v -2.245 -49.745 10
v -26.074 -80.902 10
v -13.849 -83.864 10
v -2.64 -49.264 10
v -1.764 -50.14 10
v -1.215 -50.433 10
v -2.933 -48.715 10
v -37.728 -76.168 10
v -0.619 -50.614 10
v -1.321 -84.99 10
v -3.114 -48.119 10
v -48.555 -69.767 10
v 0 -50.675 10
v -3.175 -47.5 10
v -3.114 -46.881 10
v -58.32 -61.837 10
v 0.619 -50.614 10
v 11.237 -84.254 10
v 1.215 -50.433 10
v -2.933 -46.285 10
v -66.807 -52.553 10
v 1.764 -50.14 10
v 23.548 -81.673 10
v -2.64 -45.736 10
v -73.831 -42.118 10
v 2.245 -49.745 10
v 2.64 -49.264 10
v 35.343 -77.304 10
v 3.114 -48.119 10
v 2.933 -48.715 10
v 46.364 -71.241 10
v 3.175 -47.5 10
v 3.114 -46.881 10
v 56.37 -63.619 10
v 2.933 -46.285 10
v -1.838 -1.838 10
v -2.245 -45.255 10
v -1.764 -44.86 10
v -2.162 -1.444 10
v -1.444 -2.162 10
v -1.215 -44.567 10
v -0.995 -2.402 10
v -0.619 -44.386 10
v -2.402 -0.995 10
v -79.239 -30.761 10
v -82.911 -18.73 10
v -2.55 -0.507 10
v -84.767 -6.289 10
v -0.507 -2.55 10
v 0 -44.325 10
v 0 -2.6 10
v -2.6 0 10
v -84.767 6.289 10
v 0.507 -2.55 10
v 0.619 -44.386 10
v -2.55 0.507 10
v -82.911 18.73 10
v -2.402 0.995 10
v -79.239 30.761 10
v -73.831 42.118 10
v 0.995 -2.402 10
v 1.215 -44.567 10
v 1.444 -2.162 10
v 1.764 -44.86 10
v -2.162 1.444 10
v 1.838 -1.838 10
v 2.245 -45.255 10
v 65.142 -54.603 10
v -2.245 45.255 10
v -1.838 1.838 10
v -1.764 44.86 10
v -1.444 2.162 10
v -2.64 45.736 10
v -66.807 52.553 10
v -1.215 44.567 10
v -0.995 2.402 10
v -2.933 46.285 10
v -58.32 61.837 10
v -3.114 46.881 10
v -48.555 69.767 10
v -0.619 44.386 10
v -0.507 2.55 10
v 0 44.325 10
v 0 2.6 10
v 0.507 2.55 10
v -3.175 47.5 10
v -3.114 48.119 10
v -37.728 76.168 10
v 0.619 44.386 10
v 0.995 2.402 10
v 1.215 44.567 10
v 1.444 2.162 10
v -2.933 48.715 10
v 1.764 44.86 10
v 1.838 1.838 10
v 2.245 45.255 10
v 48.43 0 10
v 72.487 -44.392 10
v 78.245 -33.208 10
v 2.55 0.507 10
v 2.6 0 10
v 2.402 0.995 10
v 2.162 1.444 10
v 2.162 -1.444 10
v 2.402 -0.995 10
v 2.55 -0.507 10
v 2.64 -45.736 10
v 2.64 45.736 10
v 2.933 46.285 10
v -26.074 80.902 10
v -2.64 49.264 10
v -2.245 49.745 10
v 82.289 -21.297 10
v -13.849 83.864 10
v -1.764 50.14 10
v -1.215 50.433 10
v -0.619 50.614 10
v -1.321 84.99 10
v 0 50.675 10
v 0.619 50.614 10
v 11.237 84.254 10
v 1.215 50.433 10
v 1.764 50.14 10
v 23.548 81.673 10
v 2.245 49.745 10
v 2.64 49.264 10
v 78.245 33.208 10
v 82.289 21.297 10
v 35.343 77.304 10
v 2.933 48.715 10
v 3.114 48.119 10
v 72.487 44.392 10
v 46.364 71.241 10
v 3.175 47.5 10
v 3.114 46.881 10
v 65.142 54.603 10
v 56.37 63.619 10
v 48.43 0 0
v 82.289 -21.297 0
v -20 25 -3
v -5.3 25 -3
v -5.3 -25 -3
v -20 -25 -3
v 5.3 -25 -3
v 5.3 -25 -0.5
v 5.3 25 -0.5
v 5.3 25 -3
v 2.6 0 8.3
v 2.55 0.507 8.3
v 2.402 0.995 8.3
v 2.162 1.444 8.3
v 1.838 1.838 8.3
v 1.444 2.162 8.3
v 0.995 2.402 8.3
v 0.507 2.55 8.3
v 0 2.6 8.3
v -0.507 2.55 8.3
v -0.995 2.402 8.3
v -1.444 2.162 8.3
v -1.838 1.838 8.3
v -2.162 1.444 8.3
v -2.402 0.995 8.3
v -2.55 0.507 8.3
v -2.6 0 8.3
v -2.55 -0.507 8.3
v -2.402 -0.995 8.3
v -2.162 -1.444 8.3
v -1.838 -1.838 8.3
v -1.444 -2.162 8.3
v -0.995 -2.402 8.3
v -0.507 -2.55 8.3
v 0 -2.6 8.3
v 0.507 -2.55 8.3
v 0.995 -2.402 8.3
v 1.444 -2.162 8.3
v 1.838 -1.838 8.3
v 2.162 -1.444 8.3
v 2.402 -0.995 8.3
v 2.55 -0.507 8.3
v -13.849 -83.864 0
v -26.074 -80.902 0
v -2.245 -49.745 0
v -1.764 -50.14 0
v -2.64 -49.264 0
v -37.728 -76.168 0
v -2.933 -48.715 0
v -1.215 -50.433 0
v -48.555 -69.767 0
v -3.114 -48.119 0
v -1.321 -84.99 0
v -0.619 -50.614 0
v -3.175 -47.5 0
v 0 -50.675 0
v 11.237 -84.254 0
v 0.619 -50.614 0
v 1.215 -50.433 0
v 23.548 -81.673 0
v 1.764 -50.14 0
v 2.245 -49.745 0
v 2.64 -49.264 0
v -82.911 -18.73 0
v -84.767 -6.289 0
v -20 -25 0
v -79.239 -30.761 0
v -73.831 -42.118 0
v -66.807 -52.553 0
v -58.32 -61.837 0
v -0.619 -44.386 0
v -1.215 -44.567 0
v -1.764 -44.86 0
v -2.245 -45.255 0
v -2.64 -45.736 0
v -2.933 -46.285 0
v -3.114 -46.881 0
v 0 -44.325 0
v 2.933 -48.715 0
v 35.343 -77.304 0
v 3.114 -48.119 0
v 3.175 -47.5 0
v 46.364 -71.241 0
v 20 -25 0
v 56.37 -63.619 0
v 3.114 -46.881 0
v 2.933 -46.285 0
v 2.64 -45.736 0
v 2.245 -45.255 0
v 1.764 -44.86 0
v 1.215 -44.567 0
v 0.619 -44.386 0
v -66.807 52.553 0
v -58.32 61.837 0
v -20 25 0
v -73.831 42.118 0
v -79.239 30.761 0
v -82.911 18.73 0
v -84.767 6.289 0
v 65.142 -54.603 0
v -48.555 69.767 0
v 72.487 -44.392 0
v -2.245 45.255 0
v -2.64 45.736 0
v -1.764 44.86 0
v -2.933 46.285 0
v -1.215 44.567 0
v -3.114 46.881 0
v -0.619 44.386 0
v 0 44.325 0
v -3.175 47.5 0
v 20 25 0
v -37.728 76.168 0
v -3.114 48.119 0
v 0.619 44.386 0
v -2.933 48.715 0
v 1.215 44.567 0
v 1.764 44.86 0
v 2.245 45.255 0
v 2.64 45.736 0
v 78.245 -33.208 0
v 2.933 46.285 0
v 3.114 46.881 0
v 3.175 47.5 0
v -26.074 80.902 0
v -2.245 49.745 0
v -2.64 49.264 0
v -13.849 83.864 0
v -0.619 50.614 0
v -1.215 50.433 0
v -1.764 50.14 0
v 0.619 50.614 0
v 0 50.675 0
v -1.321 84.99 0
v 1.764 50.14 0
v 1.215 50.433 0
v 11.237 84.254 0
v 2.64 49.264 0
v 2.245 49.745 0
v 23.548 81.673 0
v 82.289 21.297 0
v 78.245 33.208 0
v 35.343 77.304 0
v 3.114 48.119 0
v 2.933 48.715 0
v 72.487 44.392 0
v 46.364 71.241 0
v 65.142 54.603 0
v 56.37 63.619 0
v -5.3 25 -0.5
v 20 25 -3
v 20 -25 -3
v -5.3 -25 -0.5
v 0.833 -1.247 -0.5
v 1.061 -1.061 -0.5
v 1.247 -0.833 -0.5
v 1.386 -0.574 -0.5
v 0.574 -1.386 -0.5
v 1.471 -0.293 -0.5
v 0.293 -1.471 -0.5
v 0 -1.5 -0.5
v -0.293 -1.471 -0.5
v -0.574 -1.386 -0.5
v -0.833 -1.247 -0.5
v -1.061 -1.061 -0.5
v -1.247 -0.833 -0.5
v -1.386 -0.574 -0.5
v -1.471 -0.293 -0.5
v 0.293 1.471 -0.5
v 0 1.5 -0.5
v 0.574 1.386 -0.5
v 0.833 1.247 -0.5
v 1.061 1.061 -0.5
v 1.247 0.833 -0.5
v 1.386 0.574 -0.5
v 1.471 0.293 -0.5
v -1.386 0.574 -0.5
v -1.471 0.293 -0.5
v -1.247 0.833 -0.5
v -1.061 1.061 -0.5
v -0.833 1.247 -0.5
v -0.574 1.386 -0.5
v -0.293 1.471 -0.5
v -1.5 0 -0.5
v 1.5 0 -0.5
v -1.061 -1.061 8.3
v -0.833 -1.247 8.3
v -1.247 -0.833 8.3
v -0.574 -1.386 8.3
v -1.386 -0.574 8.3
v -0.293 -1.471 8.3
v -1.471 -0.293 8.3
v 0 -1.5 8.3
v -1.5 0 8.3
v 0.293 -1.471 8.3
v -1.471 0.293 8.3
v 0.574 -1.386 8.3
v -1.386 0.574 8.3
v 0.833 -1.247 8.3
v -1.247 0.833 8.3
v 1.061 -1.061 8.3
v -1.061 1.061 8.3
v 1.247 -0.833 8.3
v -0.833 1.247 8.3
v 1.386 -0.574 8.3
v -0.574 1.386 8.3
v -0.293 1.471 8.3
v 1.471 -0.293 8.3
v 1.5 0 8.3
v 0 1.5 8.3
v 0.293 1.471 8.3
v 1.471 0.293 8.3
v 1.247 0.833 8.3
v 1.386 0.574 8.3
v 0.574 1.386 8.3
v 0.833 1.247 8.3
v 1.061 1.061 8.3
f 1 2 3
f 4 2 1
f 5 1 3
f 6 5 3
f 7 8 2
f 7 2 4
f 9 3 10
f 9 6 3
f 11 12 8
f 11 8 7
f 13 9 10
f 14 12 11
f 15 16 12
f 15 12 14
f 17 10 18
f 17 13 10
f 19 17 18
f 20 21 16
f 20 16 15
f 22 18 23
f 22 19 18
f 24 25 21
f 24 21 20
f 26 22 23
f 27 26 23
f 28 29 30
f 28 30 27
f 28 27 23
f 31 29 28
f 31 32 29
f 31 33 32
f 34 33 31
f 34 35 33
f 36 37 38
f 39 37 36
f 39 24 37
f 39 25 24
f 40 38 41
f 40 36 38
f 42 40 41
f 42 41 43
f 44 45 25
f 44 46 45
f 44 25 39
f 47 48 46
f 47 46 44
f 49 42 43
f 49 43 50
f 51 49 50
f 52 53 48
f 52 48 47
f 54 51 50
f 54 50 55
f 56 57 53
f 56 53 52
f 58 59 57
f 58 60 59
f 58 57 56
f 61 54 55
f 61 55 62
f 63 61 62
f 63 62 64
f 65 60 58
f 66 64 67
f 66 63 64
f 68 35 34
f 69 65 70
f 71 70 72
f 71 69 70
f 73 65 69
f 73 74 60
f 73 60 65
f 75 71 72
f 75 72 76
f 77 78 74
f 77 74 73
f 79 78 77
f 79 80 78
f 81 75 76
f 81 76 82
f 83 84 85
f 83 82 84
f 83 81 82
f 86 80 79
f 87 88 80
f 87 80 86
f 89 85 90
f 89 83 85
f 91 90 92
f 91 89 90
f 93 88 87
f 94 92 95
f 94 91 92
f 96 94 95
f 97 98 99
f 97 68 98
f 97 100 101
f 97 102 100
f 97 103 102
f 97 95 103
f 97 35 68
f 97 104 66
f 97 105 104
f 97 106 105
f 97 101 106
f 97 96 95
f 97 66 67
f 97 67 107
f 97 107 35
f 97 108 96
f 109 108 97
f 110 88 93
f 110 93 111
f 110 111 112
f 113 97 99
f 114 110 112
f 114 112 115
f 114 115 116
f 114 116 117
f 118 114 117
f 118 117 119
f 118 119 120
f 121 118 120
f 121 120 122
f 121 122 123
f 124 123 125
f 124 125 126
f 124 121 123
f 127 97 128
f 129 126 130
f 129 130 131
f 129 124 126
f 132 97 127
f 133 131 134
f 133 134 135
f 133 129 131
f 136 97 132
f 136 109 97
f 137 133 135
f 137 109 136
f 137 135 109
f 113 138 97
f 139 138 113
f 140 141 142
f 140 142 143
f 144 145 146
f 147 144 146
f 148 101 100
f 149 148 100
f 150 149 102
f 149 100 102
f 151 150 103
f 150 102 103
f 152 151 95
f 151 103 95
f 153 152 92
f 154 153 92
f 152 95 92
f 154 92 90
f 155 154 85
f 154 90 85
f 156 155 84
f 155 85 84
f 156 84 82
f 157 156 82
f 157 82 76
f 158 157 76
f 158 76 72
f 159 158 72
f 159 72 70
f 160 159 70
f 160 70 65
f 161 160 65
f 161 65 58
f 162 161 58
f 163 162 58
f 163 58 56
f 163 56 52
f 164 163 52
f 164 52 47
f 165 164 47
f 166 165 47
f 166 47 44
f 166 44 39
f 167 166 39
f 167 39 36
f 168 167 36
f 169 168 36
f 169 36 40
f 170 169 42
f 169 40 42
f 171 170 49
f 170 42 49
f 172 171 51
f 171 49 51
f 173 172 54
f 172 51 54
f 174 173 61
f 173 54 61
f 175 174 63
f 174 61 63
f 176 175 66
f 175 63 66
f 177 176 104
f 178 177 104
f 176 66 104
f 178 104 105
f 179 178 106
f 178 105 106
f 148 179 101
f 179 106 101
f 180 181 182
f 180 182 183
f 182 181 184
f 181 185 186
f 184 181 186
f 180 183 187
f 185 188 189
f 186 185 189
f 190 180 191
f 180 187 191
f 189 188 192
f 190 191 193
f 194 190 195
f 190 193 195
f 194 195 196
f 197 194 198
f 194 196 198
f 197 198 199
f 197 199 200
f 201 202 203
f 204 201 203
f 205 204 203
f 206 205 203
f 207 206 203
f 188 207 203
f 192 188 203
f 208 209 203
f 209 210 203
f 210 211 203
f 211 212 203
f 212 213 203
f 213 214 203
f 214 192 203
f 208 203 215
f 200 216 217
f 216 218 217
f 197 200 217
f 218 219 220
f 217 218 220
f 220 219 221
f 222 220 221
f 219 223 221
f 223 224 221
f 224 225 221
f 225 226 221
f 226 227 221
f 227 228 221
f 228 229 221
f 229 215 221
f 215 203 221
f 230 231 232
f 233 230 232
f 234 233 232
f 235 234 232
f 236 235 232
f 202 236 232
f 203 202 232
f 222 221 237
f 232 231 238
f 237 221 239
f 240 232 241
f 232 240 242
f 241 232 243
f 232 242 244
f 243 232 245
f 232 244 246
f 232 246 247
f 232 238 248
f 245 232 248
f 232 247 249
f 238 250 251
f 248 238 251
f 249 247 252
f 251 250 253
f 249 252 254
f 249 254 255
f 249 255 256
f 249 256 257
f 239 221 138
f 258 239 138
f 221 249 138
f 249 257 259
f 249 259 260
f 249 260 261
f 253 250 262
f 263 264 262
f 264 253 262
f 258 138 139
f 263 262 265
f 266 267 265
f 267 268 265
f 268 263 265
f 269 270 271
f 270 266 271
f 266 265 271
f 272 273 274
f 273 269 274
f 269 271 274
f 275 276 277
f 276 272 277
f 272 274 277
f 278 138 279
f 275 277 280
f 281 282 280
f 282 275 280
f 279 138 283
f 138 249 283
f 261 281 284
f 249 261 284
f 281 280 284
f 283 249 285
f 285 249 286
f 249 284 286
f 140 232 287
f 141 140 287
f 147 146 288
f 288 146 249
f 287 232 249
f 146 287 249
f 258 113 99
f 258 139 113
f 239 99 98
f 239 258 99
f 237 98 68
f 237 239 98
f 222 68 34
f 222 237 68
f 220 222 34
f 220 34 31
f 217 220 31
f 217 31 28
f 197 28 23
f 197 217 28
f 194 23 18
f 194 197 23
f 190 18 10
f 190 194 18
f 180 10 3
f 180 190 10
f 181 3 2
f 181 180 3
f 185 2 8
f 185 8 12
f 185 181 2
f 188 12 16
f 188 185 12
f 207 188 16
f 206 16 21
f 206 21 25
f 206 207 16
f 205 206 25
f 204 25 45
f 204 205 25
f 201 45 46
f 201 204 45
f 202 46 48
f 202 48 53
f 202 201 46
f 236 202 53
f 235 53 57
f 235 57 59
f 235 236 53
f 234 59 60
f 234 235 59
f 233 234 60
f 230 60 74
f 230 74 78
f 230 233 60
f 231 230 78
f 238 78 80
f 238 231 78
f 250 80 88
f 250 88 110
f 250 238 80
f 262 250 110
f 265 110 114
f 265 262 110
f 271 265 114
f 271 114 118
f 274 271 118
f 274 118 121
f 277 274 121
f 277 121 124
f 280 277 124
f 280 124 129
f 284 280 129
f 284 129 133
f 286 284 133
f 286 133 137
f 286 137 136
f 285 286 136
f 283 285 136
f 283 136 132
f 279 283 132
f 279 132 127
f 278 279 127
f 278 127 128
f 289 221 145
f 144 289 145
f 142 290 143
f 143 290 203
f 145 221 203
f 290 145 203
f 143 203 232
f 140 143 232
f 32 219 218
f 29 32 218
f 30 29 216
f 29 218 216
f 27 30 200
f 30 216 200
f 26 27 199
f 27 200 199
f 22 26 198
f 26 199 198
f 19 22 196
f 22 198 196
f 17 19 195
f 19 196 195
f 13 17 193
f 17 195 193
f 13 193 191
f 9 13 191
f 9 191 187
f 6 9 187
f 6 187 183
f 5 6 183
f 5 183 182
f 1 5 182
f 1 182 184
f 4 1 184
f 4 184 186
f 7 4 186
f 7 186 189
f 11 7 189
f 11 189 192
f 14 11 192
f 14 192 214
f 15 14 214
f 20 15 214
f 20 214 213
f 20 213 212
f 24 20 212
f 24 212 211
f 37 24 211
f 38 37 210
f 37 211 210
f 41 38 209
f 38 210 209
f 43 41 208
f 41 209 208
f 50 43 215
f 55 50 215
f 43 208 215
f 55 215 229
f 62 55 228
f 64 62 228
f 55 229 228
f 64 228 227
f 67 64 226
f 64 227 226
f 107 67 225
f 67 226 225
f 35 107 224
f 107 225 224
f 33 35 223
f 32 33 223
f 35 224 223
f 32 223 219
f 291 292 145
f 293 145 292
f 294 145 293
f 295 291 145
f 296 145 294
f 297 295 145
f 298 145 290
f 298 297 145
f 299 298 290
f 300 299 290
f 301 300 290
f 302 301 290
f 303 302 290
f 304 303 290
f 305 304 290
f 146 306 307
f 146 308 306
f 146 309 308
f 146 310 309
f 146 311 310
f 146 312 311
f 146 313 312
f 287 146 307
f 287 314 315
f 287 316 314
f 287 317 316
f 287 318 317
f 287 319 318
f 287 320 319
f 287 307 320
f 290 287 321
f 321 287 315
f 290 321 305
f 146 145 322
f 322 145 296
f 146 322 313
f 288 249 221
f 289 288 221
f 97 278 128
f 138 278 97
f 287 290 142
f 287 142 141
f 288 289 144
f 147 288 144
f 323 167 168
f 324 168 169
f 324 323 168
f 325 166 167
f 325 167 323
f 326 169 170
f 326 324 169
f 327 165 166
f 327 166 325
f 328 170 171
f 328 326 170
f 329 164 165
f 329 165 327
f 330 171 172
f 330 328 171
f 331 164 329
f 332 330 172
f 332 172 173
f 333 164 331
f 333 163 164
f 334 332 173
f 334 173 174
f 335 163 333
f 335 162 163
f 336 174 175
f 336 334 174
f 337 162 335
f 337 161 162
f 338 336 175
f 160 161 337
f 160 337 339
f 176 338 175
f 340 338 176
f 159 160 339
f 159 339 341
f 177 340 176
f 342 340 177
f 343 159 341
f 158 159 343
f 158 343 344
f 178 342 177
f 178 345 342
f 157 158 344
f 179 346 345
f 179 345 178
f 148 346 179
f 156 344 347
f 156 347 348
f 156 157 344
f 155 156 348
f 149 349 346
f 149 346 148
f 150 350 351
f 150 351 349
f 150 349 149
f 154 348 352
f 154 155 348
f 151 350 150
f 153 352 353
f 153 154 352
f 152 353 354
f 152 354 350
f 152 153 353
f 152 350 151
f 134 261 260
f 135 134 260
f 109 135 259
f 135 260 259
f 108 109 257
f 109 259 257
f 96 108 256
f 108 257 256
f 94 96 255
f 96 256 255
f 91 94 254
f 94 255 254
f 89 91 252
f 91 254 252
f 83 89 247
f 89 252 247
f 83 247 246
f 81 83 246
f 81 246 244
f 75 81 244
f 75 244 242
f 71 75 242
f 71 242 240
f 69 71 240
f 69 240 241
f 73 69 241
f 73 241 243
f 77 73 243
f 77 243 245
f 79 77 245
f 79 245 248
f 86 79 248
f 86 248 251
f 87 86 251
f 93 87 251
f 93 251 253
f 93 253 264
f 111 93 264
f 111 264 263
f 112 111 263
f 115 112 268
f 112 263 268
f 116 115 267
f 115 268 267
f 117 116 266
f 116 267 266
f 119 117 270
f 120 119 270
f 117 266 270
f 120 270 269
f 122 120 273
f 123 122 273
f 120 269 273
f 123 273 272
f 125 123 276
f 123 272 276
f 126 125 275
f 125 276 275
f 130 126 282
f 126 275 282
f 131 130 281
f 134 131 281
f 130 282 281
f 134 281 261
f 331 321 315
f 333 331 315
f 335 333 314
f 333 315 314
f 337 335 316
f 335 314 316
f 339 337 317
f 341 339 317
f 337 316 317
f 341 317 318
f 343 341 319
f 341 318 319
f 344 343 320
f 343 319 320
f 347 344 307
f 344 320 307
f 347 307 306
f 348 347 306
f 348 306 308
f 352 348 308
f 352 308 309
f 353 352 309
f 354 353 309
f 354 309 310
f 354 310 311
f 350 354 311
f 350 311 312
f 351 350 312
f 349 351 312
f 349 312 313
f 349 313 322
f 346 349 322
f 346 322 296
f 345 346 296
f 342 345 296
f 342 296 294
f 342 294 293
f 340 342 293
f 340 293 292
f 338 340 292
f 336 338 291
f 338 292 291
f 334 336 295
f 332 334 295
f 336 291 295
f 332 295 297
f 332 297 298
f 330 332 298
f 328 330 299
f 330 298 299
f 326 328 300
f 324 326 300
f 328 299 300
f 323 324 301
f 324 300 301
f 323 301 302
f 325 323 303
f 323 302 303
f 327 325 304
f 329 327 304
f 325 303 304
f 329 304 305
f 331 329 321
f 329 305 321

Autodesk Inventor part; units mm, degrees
ref_plane "YZ Plane" through (0, 0, 0) normal (1, 0, 0) x (0, 1, 0)
sketch "Sketch1" plane through (0, 0, 0) normal (0, 0, 1) x (1, 0, 0)
  circle A0 centre (0, 0) radius 85
  line L0 (0, -85) -> (0, 85)
  line L1 (-85, 0) -> (85, 0)
  circle A1 centre (0, -47.5) radius 3.175
  circle A2 centre (0, 47.5) radius 3.175
  line L2 (82.2887, 21.2973) -> (48.4298, 0)
  line L3 (48.4298, 0) -> (82.2887, -21.2973)
  dimension "d0" = 170
  dimension "d21" = 6.35
  dimension "d22" = 47.5
  dimension "d49" = 40
  dimension "d50" = 40
  dimension "d51" = 32.17
extrude "Extrusion1" add sketch "Sketch1" along normal blind 10
sketch "Sketch2" plane through (0, 0, 0) normal (0, 0, -1) x (-1, 0, 0)
  line L0 (-20, -25) -> (20, -25)
  line L1 (20, -25) -> (20, 25)
  line L2 (20, 25) -> (-20, 25)
  line L3 (-20, 25) -> (-20, -25)
  line L4 (0, -25) -> (0, 25)
  line L5 (5.3, -25) -> (5.3, 25)
  line L6 (-5.3, -25) -> (-5.3, 25)
  circle A0 centre (0, 0) radius 1.5
  point P0 (-5.3, -25)
  point P1 (5.3, -25)
  dimension "d3" = 40
  dimension "d4" = 50
  dimension "d18" = 3
  dimension "d25" = 5.3
  dimension "d27" = 10.6
extrude "Extrusion2" add sketch "Sketch2" along normal blind 3 contours L3 L2 L6 L0 | L5 L2 L1 L0
extrude "Extrusion3" add sketch "Sketch2" along normal blind 0.5 contours L6 L2 L4 A0 L0 | L4 A0 L2 L5 L0 | A0 L4 | L4 A0
extrude "Extrusion4" cut sketch "Sketch2" along normal through all both and the other way through all contours A0 L4 | L4 A0
extrude "Extrusion5" cut sketch "Sketch1" along normal through all contours A2 L0 | L0 A2 | A1 L0 | L0 A1
thread "Thread1" size "M3x0.5" class "6H" standard "ANSI Metric M Profile" length 77
sketch "Sketch3" plane through (0, 0, 10) normal (0, 0, 1) x (1, 0, 0)
  circle A0 centre (0, 0) radius 2.6
  dimension "d30" = 5.2
extrude "Extrusion6" cut sketch "Sketch3" against normal blind 1.7
ref_plane "Work Plane1" through (0, 15, 0) normal (0, 1, 0) x (-1, 0, 0)
ref_plane "Work Plane2" through (0, -15, 0) normal (0, 1, 0) x (-1, 0, 0)
extrude "Extrusion9" cut sketch "Sketch1" along normal blind 10 contours L1 L2 A0 | A0 L3 L1
properties part number "Base" material "Wood (Maple)"
